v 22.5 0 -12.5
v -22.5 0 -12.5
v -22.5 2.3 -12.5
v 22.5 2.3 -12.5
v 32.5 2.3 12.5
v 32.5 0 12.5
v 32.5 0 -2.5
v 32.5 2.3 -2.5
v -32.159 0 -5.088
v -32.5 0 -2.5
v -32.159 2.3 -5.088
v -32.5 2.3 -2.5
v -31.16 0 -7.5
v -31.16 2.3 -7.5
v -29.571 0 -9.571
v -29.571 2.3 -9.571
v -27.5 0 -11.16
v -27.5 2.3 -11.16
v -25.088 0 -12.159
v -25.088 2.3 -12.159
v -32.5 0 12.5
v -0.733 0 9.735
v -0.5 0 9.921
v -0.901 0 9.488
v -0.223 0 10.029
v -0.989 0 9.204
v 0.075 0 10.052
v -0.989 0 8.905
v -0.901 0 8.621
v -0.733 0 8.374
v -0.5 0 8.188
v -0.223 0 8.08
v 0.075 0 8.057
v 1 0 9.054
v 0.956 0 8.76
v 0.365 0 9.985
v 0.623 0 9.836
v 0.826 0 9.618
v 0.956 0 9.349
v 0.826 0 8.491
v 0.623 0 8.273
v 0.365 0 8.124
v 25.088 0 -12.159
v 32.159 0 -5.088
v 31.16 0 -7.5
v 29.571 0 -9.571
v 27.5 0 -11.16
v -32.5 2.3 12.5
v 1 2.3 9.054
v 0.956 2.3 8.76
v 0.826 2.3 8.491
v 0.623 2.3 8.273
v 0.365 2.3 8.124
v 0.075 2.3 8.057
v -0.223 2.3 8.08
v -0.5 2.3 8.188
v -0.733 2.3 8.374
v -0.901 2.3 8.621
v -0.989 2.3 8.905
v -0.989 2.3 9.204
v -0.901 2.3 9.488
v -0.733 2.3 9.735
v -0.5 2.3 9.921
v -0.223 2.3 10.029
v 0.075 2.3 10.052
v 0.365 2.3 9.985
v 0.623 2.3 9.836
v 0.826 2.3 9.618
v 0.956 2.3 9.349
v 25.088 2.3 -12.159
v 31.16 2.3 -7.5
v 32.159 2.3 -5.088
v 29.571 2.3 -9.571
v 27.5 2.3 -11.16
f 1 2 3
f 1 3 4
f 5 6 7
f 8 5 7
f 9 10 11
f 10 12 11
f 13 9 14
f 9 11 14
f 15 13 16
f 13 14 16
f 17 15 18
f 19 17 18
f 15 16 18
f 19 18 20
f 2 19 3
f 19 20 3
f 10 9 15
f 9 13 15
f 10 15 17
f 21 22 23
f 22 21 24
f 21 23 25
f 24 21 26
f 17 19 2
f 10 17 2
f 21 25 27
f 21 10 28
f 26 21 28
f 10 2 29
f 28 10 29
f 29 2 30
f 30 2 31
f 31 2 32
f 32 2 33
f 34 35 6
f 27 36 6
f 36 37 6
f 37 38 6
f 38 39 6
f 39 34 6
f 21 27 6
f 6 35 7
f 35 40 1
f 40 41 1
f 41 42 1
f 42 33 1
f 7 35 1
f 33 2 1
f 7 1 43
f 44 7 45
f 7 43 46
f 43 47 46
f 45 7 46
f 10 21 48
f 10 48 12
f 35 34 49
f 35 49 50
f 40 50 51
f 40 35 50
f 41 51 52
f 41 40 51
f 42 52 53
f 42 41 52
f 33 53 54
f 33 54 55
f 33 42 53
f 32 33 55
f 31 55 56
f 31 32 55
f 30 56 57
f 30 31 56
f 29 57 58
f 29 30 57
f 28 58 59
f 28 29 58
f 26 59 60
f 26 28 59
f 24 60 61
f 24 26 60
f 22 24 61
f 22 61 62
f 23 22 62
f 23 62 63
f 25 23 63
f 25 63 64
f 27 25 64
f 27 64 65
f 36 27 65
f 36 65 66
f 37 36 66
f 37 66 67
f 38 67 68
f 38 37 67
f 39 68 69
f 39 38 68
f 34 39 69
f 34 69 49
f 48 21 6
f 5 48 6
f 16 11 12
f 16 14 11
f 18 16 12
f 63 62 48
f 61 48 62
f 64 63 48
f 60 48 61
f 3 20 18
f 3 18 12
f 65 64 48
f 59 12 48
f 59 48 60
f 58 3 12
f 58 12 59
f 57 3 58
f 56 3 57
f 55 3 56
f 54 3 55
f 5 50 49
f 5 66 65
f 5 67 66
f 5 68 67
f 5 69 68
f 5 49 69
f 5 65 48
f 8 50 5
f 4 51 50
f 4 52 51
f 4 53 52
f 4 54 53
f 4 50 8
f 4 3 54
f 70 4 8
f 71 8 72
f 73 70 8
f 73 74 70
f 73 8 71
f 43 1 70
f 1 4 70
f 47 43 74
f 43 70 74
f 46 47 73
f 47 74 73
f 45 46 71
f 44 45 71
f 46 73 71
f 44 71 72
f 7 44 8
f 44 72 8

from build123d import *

# Parameters (mm, degrees)
SKETCH2_W           = 65
SKETCH2_H           = 25
SKETCH2_R           = 1
BOSS_EXTRUDE1_DEPTH = 2.3
FILLET9_R           = 10


with BuildPart() as part:
    # Sketch2 → Boss-Extrude1 (new body)
    with BuildSketch(Plane(origin=(0, 0, 0), x_dir=(1, 0, 0), z_dir=(0, 1, 0))):
        Rectangle(SKETCH2_W, SKETCH2_H)
        with Locations((0, -9.054487493)):
            Circle(SKETCH2_R, mode=Mode.SUBTRACT)
    extrude(amount=BOSS_EXTRUDE1_DEPTH)

    # Fillet9
    fillet9_edges = [part.edges().sort_by_distance(p)[0] for p in [
        (-32.5, 1.15, -12.5),
        (32.5, 1.15, -12.5),
    ]]
    fillet(fillet9_edges, radius=FILLET9_R)


solid = part.part
